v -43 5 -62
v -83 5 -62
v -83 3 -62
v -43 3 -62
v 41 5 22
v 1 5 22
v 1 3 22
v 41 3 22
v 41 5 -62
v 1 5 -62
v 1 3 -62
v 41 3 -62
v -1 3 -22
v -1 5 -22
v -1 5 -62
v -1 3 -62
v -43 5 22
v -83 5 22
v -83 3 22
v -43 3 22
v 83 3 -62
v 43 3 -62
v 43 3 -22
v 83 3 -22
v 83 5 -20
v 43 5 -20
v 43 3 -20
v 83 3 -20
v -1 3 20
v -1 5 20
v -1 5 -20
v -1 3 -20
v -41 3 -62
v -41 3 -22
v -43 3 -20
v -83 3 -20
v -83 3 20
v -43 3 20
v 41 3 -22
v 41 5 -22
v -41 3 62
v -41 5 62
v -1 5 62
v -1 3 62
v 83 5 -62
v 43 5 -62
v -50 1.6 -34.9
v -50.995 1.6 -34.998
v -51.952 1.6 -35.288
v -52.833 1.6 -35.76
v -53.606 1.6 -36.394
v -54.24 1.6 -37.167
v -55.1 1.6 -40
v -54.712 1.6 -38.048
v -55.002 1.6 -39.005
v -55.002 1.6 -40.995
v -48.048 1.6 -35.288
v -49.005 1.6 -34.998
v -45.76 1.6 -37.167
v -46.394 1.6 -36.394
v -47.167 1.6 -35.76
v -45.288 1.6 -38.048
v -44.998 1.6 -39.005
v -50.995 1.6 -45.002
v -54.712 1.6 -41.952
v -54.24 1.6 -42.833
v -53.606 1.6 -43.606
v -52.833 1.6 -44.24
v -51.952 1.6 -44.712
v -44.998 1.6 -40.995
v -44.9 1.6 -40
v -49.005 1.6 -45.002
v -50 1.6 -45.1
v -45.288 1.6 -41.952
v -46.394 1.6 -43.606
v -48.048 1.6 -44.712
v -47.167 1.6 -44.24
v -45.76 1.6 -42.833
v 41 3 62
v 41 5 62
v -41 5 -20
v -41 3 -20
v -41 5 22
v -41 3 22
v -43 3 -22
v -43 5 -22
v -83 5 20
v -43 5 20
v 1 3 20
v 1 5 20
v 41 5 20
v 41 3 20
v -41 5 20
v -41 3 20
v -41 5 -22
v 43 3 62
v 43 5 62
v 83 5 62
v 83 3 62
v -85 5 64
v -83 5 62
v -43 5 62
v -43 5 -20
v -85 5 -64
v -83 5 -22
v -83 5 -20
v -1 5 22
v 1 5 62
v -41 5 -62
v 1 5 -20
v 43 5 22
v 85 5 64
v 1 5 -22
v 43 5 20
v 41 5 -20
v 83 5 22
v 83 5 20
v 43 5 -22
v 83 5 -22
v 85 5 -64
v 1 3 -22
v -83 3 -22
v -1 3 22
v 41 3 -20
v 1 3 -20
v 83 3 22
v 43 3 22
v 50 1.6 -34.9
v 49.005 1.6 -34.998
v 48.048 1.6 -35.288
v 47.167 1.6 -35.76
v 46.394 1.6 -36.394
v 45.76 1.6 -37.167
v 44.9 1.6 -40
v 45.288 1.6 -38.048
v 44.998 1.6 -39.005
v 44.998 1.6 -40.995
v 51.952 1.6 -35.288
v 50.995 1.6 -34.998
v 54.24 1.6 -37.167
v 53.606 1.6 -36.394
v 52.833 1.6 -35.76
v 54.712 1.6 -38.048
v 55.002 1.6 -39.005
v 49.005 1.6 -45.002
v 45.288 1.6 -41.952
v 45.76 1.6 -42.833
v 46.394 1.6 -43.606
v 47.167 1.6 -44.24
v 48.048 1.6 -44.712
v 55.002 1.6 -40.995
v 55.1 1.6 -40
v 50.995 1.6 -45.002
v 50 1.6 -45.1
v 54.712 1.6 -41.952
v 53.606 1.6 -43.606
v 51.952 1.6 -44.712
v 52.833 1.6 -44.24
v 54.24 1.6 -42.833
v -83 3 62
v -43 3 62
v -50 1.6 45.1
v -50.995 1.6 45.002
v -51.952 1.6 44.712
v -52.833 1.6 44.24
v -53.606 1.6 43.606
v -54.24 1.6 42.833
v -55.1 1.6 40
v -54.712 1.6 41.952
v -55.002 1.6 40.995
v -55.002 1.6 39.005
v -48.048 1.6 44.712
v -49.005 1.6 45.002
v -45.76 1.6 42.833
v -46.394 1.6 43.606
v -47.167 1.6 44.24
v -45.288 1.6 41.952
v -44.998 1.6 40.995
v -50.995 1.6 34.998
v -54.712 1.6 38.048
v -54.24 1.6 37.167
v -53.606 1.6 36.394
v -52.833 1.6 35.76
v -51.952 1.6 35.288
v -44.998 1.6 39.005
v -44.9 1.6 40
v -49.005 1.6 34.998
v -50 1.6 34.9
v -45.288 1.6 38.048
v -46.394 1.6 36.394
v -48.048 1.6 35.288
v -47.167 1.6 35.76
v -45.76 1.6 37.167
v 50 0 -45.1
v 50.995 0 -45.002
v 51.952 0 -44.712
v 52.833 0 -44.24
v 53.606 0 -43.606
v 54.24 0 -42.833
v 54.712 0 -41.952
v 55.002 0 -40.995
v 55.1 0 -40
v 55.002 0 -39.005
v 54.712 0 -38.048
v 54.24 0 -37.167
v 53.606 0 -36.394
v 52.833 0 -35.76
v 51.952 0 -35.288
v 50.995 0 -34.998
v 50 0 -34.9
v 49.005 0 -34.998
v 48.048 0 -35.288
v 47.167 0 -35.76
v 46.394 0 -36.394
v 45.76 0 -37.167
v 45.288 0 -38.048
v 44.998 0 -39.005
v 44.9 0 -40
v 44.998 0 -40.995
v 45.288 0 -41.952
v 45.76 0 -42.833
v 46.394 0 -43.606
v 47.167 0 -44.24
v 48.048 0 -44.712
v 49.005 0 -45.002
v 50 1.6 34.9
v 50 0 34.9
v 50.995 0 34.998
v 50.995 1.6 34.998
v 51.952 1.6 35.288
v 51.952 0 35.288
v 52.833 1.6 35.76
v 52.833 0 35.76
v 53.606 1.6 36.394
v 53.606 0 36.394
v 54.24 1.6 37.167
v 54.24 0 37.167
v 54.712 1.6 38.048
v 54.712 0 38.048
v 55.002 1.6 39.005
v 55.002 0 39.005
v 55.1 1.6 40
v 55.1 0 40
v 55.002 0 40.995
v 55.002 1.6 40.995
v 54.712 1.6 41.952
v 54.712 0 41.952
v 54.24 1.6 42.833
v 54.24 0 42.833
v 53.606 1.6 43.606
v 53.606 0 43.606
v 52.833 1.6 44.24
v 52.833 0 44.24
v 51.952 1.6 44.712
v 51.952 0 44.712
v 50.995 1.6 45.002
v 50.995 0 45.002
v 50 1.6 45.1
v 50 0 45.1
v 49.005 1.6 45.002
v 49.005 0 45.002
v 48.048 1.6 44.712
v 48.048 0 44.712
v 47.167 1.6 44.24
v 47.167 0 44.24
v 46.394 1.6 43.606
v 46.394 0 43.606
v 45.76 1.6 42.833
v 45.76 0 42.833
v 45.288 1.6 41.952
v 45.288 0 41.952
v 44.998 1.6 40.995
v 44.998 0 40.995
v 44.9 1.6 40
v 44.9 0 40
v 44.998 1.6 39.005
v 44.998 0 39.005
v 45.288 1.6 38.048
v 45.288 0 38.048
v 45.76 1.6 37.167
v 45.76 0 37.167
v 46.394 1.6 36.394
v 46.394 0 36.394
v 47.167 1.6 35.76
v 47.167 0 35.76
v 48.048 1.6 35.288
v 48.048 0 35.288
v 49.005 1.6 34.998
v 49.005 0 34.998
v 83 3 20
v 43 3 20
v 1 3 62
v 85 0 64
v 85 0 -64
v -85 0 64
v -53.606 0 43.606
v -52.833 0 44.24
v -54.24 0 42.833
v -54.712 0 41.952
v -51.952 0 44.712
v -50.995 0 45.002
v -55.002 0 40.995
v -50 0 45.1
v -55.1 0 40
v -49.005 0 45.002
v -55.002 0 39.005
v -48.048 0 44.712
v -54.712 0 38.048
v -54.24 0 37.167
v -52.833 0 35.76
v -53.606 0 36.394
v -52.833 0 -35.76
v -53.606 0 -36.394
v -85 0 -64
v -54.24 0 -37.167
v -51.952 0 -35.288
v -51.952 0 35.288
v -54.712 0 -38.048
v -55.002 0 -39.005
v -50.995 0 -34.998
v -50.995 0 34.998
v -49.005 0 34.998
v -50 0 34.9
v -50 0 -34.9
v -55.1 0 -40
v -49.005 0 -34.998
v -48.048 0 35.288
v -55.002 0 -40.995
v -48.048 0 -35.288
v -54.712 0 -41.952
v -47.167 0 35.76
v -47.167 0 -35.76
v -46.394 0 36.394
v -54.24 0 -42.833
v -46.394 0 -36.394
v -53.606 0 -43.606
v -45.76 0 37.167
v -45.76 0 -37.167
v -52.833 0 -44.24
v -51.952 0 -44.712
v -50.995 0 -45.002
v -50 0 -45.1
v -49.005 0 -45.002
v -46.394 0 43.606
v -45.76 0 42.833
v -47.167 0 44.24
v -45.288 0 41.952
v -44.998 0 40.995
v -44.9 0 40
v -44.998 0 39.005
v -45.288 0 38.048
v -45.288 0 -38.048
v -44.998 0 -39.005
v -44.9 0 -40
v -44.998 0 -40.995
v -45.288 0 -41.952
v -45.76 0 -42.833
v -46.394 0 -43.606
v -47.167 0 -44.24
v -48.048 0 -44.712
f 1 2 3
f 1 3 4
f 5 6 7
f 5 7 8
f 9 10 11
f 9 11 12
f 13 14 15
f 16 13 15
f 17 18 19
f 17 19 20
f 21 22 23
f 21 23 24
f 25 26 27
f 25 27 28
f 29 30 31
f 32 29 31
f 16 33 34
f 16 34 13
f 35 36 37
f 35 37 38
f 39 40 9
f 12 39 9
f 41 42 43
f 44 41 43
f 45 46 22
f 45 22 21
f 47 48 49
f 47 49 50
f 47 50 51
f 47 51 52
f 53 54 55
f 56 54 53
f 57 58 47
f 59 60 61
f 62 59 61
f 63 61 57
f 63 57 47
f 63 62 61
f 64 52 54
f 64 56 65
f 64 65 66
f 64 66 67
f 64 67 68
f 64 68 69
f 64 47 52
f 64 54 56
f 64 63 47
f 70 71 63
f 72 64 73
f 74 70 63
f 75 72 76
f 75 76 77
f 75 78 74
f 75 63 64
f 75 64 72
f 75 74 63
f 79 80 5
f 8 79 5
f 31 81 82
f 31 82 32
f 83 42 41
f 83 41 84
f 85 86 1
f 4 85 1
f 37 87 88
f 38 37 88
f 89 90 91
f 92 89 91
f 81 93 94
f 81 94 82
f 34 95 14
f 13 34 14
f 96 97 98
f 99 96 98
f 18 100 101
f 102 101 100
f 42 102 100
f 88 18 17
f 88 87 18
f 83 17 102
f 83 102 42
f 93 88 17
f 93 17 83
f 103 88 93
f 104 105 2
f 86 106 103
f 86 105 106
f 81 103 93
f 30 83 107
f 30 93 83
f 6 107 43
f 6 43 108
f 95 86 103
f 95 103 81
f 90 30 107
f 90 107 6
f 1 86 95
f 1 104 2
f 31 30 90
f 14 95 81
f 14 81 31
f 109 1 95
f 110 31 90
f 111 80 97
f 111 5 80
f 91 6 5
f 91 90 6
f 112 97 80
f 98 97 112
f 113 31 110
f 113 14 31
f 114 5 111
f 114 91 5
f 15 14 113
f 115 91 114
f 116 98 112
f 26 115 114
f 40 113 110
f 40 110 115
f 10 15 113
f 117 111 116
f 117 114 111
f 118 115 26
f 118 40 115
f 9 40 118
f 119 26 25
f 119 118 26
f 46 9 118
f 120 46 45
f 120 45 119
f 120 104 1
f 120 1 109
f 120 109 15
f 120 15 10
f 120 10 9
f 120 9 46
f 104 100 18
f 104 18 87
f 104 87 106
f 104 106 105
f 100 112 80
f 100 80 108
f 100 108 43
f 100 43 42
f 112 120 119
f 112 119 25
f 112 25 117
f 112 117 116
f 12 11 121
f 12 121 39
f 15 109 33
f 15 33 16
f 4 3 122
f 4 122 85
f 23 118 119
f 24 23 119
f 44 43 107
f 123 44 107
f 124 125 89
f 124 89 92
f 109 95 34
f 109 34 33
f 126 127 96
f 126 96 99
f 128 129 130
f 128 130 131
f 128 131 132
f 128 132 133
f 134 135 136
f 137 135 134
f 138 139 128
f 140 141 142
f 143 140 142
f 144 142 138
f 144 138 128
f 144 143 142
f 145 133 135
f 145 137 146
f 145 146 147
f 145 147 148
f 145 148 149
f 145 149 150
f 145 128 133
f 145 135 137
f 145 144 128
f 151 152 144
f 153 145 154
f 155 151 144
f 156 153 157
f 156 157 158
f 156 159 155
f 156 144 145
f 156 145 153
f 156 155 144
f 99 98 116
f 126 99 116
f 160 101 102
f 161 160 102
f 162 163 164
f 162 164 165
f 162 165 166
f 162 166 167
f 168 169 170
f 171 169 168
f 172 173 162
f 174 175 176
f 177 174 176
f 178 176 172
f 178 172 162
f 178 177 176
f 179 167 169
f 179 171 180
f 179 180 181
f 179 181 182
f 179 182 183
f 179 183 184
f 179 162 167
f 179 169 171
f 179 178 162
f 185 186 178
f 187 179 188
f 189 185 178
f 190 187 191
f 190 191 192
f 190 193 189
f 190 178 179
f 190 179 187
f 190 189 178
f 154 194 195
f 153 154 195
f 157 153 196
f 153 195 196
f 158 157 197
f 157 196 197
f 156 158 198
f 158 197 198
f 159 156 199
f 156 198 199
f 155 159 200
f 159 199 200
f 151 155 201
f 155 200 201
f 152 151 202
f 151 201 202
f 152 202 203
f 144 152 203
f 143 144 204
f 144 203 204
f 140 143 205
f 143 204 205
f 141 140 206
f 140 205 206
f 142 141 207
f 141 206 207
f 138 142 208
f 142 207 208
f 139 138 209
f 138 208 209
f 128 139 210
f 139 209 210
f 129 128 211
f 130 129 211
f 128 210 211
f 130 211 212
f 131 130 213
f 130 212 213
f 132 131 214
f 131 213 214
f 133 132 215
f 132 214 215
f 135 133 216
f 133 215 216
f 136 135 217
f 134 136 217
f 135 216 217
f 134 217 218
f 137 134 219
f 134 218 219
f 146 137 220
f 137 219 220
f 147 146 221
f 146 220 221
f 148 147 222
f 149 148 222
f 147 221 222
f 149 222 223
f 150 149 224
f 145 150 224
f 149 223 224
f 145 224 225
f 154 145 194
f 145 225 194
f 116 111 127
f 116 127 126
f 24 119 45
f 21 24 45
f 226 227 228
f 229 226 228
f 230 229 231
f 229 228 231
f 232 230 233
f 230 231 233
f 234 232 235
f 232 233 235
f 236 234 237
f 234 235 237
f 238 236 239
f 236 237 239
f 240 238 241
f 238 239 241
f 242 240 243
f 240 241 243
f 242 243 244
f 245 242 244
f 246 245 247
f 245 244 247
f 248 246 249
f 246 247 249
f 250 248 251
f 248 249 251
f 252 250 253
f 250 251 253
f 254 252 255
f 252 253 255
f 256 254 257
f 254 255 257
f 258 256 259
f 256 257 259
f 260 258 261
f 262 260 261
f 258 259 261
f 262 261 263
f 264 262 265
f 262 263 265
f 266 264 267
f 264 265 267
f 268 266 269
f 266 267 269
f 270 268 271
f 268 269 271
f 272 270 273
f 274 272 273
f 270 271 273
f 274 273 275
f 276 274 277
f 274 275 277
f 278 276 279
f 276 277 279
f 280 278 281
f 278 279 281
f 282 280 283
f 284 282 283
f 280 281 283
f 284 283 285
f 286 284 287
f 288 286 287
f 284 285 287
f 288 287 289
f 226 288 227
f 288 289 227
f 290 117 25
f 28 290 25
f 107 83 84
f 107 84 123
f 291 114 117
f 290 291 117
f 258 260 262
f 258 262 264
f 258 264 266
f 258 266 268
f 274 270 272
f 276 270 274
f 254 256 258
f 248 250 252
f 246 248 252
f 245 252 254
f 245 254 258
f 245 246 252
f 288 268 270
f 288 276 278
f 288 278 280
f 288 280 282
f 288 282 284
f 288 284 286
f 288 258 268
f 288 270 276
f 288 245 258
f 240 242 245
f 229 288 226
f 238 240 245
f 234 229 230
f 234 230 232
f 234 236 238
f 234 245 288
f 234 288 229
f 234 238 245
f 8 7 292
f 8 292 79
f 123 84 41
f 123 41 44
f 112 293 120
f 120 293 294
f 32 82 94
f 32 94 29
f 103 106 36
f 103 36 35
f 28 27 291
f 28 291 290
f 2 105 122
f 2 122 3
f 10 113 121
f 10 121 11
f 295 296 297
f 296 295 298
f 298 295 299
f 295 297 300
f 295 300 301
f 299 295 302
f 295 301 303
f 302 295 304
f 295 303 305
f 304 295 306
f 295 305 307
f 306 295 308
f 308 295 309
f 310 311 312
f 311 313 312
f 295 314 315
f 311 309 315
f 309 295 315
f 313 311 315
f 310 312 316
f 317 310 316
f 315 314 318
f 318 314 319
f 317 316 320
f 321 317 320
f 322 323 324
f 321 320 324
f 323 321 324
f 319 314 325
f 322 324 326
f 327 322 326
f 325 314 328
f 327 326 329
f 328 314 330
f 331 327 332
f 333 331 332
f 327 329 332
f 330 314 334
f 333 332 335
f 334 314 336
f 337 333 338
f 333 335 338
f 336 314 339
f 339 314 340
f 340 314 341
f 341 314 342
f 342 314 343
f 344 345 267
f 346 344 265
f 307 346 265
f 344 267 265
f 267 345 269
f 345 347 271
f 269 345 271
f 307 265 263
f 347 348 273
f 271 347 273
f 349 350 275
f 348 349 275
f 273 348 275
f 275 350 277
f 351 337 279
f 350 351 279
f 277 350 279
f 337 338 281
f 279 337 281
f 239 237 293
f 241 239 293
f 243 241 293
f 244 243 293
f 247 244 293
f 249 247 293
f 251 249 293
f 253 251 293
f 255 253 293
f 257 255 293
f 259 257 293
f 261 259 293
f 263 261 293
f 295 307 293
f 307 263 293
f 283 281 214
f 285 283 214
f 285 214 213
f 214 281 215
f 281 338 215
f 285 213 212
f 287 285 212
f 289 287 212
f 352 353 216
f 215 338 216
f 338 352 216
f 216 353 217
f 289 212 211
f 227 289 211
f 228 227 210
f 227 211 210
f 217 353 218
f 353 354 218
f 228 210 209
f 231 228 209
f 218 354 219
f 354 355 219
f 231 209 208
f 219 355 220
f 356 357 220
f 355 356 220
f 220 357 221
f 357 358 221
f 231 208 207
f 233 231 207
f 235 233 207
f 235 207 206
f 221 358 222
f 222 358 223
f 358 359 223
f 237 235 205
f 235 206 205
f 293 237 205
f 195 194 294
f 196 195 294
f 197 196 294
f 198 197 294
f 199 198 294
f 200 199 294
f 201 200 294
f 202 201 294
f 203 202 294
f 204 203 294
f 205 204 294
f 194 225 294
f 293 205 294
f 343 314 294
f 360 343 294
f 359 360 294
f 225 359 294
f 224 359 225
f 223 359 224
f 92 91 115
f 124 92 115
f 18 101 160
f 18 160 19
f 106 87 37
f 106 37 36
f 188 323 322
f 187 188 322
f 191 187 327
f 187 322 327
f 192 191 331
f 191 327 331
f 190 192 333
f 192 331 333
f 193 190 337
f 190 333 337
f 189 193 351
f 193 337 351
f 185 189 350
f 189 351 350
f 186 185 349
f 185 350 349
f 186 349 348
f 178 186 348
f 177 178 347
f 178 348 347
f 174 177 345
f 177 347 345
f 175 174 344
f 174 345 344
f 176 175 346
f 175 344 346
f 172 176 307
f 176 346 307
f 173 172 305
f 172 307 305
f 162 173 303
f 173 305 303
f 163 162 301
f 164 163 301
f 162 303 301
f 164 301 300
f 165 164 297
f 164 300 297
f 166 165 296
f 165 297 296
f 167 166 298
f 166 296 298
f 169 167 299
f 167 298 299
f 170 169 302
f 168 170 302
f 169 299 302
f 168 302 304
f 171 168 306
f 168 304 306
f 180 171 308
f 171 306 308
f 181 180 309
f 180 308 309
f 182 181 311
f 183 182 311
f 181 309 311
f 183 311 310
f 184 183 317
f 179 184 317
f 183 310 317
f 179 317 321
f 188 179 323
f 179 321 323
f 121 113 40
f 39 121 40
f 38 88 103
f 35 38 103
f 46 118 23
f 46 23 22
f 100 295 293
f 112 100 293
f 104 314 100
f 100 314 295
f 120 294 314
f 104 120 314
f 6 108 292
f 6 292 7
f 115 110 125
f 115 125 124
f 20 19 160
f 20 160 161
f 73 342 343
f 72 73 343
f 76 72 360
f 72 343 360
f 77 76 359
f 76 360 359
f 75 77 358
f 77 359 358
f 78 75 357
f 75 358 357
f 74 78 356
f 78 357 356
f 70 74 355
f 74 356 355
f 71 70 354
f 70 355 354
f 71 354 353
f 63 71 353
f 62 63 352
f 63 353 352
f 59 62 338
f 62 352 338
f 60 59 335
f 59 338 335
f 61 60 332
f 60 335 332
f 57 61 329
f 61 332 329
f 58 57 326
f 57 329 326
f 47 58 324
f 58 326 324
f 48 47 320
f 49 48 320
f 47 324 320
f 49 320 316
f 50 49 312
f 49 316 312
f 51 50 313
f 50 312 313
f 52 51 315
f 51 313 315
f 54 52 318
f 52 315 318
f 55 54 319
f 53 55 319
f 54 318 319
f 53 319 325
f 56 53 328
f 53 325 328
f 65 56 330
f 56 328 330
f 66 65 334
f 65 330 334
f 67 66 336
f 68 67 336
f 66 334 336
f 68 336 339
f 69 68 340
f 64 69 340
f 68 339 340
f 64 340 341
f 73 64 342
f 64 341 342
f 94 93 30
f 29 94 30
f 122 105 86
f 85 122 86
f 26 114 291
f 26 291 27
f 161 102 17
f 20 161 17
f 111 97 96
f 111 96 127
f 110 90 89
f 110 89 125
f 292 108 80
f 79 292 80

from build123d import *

# Parameters (mm, degrees)
EXTRUDE_1_DEPTH     = 5
SKETCH_5_W          = 40
SKETCH_5_H          = 40
CUT_EXTRUDE_1_DEPTH = 2
SKETCH_7_R          = 2.5
CUT_EXTRUDE_2_DEPTH = 1.6
SKETCH_8_R          = 2.6
CUT_EXTRUDE_3_DEPTH = 1.6
SKETCH_9_R          = 5.1
CUT_EXTRUDE_4_DEPTH = 1.6


with BuildPart() as part:
    # 草图4 → 凸台-拉伸1 (new body)
    with BuildSketch(Plane(origin=(0, 0, 0), x_dir=(1, 0, 0), z_dir=(0, 1, 0))):
        Polygon((-85, 0), (0, 0), (85, 0), (85, 64), (-85, 64), align=None)
        Polygon((85, 0), (0, 0), (-85, 0), (-85, -64), (85, -64), align=None)
    extrude(amount=EXTRUDE_1_DEPTH)

    # 草图5 → 切除-拉伸1 (cut)
    with BuildSketch(Plane(origin=(0, 5, 0), x_dir=(1, 0, 0), z_dir=(0, 1, 0))):
        with Locations((-21, 42)):
            Rectangle(SKETCH_5_W, SKETCH_5_H)
        with Locations((-63, 42)):
            Rectangle(SKETCH_5_W, SKETCH_5_H)
        with Locations((21, 42)):
            Rectangle(SKETCH_5_W, SKETCH_5_H)
        with Locations((63, 42)):
            Rectangle(SKETCH_5_W, SKETCH_5_H)
        with Locations((-21, 0)):
            Rectangle(SKETCH_5_W, SKETCH_5_H)
        with Locations((21, 0)):
            Rectangle(SKETCH_5_W, SKETCH_5_H)
        with Locations((63, 0)):
            Rectangle(SKETCH_5_W, SKETCH_5_H)
        with Locations((-21, -42)):
            Rectangle(SKETCH_5_W, SKETCH_5_H)
        with Locations((21, -42)):
            Rectangle(SKETCH_5_W, SKETCH_5_H)
        with Locations((63, -42)):
            Rectangle(SKETCH_5_W, SKETCH_5_H)
        with Locations((-63, 0)):
            Rectangle(SKETCH_5_W, SKETCH_5_H)
        with Locations((-63, -42)):
            Rectangle(SKETCH_5_W, SKETCH_5_H)
    extrude(amount=-CUT_EXTRUDE_1_DEPTH, mode=Mode.SUBTRACT)

    # 草图7 → 切除-拉伸2 (cut)
    with BuildSketch(Plane.XZ):
        with Locations(Location((-50, 40, 0), (0, 0, 270))):
            Circle(SKETCH_7_R)
        with Locations(Location((50, 40, 0), (0, 0, 270))):
            Circle(SKETCH_7_R)
        with Locations(Location((50, -40, 0), (0, 0, 270))):
            Circle(SKETCH_7_R)
        with Locations(Location((-50, -40, 0), (0, 0, 270))):
            Circle(SKETCH_7_R)
    extrude(amount=-CUT_EXTRUDE_2_DEPTH, mode=Mode.SUBTRACT)

    # 草图8 → 切除-拉伸3 (cut)
    with BuildSketch(Plane.XZ):
        with Locations(Location((-50, 40, 0), (0, 0, 270))):
            Circle(SKETCH_8_R)
        with Locations(Location((50, 40, 0), (0, 0, 270))):
            Circle(SKETCH_8_R)
        with Locations(Location((50, -40, 0), (0, 0, 270))):
            Circle(SKETCH_8_R)
        with Locations(Location((-50, -40, 0), (0, 0, 270))):
            Circle(SKETCH_8_R)
    extrude(amount=-CUT_EXTRUDE_3_DEPTH, mode=Mode.SUBTRACT)

    # 草图9 → 切除-拉伸4 (cut)
    with BuildSketch(Plane.XZ):
        with Locations(Location((-50, 40, 0), (0, 0, 270))):
            Circle(SKETCH_9_R)
        with Locations(Location((50, 40, 0), (0, 0, 270))):
            Circle(SKETCH_9_R)
        with Locations(Location((50, -40, 0), (0, 0, 270))):
            Circle(SKETCH_9_R)
        with Locations(Location((-50, -40, 0), (0, 0, 270))):
            Circle(SKETCH_9_R)
    extrude(amount=-CUT_EXTRUDE_4_DEPTH, mode=Mode.SUBTRACT)


solid = part.part
